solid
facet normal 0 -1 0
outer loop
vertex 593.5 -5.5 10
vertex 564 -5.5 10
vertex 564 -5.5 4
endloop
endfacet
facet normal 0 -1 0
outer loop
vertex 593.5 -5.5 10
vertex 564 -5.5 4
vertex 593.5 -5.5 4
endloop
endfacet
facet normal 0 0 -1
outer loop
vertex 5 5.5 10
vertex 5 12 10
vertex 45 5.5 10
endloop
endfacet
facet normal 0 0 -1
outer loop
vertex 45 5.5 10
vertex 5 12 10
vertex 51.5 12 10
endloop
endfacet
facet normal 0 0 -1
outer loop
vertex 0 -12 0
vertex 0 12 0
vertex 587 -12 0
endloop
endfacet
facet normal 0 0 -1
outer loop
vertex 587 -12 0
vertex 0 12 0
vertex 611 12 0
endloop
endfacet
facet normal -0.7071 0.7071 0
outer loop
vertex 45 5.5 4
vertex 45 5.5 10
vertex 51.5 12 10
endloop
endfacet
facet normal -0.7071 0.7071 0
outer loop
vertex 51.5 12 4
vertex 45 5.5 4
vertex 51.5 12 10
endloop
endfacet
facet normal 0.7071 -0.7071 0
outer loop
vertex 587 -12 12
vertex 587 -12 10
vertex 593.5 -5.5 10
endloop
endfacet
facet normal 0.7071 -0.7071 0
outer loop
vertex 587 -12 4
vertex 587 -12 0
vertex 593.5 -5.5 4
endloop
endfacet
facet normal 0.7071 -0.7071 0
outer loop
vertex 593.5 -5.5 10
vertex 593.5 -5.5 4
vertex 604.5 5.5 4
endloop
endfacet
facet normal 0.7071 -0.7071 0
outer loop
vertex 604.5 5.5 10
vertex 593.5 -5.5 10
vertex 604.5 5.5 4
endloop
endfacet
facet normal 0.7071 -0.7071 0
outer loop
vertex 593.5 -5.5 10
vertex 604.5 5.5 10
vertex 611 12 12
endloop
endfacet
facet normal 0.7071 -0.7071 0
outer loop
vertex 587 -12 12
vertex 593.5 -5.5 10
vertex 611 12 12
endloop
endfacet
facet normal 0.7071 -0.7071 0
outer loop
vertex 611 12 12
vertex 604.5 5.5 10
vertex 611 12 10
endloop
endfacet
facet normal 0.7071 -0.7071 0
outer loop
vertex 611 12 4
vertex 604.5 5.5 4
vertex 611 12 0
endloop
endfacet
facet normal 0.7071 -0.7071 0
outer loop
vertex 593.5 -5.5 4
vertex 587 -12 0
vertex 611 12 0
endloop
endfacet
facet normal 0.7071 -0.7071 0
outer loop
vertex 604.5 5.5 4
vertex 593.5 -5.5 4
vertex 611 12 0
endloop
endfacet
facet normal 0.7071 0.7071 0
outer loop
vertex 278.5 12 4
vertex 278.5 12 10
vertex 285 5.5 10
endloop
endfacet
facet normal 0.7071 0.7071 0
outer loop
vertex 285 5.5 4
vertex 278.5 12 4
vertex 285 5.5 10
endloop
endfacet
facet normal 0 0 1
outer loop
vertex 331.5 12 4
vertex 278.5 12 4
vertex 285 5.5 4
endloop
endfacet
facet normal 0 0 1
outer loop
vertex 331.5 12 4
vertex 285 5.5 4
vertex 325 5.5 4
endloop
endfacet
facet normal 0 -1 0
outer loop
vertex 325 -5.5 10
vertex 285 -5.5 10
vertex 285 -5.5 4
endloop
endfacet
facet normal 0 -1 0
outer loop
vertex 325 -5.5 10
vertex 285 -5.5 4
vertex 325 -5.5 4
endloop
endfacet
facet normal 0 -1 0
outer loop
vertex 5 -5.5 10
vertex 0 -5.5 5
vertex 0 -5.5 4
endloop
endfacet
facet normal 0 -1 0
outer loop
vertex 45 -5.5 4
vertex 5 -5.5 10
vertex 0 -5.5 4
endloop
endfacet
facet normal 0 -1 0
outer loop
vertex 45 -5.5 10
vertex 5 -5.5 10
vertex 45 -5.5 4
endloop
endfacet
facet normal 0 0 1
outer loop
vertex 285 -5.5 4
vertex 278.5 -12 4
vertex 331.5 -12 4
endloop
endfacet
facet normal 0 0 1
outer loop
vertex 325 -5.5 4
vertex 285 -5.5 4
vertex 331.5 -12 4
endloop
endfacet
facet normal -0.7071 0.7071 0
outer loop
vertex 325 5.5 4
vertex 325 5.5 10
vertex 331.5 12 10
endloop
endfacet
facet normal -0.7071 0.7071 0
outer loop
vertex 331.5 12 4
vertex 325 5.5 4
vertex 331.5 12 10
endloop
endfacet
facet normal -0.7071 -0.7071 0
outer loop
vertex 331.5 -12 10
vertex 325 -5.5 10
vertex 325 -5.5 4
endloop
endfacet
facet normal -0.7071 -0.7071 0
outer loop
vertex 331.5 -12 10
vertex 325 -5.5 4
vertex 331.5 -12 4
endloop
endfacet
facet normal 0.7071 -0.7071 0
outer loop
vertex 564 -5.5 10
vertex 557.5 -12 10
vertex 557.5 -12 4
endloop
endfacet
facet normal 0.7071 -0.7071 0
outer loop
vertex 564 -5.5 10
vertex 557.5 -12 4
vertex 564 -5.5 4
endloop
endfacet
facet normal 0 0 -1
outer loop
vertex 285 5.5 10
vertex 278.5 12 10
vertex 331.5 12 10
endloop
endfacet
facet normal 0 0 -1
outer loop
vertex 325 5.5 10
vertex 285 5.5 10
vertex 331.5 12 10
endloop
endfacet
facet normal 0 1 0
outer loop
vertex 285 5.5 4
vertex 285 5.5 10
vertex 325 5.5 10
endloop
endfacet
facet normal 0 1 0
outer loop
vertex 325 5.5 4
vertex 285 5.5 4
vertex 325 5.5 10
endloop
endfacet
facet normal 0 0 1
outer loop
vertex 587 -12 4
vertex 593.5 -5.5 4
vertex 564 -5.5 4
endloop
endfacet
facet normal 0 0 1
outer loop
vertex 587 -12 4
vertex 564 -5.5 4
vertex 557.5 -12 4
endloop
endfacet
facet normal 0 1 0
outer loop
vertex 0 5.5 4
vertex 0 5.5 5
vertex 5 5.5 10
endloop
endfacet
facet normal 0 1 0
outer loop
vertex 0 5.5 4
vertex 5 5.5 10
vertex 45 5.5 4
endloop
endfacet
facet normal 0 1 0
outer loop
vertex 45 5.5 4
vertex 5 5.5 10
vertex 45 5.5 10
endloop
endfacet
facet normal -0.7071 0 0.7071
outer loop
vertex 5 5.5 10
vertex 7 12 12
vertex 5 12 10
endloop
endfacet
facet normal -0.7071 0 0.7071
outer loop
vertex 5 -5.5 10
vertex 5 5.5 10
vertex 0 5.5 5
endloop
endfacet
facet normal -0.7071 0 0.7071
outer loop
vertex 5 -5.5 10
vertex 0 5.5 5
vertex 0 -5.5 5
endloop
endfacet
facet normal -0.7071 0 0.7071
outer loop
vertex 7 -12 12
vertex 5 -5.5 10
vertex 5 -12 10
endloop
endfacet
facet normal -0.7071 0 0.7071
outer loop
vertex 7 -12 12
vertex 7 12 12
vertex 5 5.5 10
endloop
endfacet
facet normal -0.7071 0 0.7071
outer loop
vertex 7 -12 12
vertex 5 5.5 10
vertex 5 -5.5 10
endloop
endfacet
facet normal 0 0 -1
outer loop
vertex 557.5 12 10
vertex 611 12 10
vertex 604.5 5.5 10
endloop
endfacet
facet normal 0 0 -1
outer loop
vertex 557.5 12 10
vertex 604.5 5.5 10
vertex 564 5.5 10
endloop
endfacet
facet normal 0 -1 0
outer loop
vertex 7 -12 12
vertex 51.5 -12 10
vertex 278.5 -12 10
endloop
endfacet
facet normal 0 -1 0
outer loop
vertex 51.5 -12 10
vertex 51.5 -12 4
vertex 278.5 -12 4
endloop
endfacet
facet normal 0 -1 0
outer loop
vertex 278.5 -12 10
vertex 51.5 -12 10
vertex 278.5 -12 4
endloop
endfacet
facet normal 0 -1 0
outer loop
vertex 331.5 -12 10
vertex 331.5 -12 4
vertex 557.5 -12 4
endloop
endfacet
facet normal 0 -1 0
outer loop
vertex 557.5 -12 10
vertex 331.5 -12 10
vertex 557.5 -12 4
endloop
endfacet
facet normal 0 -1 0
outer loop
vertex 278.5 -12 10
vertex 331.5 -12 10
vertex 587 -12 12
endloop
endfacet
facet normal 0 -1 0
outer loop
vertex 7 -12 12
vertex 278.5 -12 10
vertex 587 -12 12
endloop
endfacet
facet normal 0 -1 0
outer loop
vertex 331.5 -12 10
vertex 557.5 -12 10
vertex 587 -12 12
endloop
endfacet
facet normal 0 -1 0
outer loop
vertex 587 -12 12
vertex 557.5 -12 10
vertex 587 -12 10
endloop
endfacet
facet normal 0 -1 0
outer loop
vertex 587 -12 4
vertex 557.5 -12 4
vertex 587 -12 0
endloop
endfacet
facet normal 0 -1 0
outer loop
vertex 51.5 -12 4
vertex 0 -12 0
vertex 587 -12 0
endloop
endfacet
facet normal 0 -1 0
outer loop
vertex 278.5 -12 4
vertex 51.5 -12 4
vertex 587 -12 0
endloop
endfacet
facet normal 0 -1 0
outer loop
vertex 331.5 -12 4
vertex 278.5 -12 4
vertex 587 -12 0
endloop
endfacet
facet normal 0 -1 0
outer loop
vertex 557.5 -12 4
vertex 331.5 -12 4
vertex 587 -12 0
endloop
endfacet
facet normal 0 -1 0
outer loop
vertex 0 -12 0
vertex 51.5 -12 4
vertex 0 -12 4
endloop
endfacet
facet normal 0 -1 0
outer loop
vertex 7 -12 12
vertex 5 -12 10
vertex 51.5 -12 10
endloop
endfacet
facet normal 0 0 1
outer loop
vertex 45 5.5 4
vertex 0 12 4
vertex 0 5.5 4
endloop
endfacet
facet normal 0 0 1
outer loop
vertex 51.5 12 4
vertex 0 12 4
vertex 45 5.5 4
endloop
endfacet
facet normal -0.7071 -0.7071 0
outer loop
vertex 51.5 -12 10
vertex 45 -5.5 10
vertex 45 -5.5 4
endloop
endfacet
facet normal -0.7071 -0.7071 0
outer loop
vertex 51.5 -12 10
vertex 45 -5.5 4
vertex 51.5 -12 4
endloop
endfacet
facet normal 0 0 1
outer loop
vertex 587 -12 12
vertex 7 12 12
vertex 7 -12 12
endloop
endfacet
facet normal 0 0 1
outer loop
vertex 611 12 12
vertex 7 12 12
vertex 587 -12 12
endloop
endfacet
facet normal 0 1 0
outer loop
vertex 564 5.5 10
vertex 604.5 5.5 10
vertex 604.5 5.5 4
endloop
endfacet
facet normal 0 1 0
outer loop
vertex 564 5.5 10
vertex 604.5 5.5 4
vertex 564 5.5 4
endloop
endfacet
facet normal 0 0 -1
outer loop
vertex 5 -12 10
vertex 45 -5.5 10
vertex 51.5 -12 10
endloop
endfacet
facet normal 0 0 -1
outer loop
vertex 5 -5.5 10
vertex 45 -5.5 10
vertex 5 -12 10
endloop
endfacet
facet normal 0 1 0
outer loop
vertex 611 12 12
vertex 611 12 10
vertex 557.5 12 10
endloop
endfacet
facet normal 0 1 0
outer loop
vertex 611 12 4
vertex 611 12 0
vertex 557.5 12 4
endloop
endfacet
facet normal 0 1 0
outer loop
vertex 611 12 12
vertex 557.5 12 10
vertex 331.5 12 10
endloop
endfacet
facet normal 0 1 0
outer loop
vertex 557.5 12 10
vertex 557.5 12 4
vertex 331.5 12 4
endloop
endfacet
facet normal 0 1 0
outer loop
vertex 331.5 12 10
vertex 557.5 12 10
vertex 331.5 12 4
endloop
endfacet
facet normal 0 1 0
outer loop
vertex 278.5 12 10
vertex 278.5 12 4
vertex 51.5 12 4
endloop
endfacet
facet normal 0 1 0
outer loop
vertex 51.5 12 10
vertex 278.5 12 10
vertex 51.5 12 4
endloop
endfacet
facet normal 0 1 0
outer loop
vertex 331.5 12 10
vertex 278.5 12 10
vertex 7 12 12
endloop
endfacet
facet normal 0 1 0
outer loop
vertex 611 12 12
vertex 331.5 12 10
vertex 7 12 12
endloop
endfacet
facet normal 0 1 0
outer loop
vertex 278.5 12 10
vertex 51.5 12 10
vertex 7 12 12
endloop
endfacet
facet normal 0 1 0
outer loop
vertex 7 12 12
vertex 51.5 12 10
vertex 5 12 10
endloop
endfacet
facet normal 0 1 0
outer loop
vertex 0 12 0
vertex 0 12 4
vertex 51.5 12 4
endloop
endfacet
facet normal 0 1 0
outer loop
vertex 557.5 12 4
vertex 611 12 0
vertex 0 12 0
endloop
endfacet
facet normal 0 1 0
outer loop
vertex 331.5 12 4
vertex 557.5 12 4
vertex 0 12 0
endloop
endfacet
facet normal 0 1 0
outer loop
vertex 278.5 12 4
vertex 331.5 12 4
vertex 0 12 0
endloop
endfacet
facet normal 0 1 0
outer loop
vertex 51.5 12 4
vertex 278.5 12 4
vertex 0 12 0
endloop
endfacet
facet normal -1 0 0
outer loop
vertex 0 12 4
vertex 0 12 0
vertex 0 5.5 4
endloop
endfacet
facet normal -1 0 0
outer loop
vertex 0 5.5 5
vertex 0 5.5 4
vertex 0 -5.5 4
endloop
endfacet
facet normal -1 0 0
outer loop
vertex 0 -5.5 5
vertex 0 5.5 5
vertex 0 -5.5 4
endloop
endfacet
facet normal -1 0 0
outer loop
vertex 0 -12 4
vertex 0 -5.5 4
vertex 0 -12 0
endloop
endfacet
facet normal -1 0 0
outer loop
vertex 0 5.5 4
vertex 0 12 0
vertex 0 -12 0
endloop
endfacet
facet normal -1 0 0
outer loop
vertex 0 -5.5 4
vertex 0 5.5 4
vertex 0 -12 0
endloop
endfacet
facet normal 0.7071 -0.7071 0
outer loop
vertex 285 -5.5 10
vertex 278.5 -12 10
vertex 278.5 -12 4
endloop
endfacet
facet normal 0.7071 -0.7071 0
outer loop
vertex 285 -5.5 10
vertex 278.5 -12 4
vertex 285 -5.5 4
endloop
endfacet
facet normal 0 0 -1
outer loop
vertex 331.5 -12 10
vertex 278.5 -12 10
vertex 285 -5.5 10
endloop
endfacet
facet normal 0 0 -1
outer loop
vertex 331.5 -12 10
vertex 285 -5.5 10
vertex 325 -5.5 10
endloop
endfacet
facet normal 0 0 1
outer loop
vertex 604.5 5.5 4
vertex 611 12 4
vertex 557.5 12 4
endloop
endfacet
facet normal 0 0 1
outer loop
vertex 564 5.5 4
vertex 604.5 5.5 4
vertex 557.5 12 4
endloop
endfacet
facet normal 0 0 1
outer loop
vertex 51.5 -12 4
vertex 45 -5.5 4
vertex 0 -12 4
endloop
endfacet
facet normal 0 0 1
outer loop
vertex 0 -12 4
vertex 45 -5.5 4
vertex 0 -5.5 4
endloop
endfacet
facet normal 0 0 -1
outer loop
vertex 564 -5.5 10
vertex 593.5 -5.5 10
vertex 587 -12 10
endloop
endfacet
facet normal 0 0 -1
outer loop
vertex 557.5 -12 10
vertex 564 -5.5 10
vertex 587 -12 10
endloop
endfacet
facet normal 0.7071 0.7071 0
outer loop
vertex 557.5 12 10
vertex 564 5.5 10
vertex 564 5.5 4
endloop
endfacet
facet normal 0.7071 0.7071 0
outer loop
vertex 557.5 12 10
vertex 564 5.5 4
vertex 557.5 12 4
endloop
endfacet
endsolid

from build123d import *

# Parameters (mm, degrees)
EXTRUDE_1_DEPTH     = 12
CUT_EXTRUDE_START   = -2
CUT_EXTRUDE_1_DEPTH = 6
CHAMFER_1_SIZE      = 7
CUT_EXTRUDE_2_DEPTH = 6


with BuildPart() as part:
    # 草图1 → 凸台-拉伸1 (new body)
    with BuildSketch(Plane.XY):
        Polygon((0, 12), (0, -12), (587, -12), (611, 12), align=None)
    extrude(amount=EXTRUDE_1_DEPTH)

    # 草图2 → 切除-拉伸1 (cut)
    with BuildSketch(Plane.XY.offset(12).offset(CUT_EXTRUDE_START)):
        Polygon((278.5, 12), (285, 5.5), (325, 5.5), (331.5, 12), align=None)
    cut_extrude_1 = extrude(amount=-CUT_EXTRUDE_1_DEPTH, mode=Mode.SUBTRACT)

    # 倒角1
    chamfer_1_edges = [part.edges().sort_by_distance(p)[0] for p in [
        (0, 0, 12),
    ]]
    chamfer(chamfer_1_edges, length=CHAMFER_1_SIZE)

    # 镜向1: 切除-拉伸1 across plane
    add(cut_extrude_1.mirror(Plane.ZX), mode=Mode.SUBTRACT)

    # 草图3 → 切除-拉伸2 (cut)
    with BuildSketch(Plane.XY.offset(12).offset(CUT_EXTRUDE_START)):
        Polygon((593.5, -5.5), (587, -12), (557.5, -12), (564, -5.5), align=None)
        Polygon((611, 12), (604.5, 5.5), (564, 5.5), (557.5, 12), align=None)
        Polygon((0, 12), (0, 5.5), (45, 5.5), (51.5, 12), align=None)
        Polygon((0, -12), (0, -5.5), (45, -5.5), (51.5, -12), align=None)
    extrude(amount=-CUT_EXTRUDE_2_DEPTH, mode=Mode.SUBTRACT)


solid = part.part
